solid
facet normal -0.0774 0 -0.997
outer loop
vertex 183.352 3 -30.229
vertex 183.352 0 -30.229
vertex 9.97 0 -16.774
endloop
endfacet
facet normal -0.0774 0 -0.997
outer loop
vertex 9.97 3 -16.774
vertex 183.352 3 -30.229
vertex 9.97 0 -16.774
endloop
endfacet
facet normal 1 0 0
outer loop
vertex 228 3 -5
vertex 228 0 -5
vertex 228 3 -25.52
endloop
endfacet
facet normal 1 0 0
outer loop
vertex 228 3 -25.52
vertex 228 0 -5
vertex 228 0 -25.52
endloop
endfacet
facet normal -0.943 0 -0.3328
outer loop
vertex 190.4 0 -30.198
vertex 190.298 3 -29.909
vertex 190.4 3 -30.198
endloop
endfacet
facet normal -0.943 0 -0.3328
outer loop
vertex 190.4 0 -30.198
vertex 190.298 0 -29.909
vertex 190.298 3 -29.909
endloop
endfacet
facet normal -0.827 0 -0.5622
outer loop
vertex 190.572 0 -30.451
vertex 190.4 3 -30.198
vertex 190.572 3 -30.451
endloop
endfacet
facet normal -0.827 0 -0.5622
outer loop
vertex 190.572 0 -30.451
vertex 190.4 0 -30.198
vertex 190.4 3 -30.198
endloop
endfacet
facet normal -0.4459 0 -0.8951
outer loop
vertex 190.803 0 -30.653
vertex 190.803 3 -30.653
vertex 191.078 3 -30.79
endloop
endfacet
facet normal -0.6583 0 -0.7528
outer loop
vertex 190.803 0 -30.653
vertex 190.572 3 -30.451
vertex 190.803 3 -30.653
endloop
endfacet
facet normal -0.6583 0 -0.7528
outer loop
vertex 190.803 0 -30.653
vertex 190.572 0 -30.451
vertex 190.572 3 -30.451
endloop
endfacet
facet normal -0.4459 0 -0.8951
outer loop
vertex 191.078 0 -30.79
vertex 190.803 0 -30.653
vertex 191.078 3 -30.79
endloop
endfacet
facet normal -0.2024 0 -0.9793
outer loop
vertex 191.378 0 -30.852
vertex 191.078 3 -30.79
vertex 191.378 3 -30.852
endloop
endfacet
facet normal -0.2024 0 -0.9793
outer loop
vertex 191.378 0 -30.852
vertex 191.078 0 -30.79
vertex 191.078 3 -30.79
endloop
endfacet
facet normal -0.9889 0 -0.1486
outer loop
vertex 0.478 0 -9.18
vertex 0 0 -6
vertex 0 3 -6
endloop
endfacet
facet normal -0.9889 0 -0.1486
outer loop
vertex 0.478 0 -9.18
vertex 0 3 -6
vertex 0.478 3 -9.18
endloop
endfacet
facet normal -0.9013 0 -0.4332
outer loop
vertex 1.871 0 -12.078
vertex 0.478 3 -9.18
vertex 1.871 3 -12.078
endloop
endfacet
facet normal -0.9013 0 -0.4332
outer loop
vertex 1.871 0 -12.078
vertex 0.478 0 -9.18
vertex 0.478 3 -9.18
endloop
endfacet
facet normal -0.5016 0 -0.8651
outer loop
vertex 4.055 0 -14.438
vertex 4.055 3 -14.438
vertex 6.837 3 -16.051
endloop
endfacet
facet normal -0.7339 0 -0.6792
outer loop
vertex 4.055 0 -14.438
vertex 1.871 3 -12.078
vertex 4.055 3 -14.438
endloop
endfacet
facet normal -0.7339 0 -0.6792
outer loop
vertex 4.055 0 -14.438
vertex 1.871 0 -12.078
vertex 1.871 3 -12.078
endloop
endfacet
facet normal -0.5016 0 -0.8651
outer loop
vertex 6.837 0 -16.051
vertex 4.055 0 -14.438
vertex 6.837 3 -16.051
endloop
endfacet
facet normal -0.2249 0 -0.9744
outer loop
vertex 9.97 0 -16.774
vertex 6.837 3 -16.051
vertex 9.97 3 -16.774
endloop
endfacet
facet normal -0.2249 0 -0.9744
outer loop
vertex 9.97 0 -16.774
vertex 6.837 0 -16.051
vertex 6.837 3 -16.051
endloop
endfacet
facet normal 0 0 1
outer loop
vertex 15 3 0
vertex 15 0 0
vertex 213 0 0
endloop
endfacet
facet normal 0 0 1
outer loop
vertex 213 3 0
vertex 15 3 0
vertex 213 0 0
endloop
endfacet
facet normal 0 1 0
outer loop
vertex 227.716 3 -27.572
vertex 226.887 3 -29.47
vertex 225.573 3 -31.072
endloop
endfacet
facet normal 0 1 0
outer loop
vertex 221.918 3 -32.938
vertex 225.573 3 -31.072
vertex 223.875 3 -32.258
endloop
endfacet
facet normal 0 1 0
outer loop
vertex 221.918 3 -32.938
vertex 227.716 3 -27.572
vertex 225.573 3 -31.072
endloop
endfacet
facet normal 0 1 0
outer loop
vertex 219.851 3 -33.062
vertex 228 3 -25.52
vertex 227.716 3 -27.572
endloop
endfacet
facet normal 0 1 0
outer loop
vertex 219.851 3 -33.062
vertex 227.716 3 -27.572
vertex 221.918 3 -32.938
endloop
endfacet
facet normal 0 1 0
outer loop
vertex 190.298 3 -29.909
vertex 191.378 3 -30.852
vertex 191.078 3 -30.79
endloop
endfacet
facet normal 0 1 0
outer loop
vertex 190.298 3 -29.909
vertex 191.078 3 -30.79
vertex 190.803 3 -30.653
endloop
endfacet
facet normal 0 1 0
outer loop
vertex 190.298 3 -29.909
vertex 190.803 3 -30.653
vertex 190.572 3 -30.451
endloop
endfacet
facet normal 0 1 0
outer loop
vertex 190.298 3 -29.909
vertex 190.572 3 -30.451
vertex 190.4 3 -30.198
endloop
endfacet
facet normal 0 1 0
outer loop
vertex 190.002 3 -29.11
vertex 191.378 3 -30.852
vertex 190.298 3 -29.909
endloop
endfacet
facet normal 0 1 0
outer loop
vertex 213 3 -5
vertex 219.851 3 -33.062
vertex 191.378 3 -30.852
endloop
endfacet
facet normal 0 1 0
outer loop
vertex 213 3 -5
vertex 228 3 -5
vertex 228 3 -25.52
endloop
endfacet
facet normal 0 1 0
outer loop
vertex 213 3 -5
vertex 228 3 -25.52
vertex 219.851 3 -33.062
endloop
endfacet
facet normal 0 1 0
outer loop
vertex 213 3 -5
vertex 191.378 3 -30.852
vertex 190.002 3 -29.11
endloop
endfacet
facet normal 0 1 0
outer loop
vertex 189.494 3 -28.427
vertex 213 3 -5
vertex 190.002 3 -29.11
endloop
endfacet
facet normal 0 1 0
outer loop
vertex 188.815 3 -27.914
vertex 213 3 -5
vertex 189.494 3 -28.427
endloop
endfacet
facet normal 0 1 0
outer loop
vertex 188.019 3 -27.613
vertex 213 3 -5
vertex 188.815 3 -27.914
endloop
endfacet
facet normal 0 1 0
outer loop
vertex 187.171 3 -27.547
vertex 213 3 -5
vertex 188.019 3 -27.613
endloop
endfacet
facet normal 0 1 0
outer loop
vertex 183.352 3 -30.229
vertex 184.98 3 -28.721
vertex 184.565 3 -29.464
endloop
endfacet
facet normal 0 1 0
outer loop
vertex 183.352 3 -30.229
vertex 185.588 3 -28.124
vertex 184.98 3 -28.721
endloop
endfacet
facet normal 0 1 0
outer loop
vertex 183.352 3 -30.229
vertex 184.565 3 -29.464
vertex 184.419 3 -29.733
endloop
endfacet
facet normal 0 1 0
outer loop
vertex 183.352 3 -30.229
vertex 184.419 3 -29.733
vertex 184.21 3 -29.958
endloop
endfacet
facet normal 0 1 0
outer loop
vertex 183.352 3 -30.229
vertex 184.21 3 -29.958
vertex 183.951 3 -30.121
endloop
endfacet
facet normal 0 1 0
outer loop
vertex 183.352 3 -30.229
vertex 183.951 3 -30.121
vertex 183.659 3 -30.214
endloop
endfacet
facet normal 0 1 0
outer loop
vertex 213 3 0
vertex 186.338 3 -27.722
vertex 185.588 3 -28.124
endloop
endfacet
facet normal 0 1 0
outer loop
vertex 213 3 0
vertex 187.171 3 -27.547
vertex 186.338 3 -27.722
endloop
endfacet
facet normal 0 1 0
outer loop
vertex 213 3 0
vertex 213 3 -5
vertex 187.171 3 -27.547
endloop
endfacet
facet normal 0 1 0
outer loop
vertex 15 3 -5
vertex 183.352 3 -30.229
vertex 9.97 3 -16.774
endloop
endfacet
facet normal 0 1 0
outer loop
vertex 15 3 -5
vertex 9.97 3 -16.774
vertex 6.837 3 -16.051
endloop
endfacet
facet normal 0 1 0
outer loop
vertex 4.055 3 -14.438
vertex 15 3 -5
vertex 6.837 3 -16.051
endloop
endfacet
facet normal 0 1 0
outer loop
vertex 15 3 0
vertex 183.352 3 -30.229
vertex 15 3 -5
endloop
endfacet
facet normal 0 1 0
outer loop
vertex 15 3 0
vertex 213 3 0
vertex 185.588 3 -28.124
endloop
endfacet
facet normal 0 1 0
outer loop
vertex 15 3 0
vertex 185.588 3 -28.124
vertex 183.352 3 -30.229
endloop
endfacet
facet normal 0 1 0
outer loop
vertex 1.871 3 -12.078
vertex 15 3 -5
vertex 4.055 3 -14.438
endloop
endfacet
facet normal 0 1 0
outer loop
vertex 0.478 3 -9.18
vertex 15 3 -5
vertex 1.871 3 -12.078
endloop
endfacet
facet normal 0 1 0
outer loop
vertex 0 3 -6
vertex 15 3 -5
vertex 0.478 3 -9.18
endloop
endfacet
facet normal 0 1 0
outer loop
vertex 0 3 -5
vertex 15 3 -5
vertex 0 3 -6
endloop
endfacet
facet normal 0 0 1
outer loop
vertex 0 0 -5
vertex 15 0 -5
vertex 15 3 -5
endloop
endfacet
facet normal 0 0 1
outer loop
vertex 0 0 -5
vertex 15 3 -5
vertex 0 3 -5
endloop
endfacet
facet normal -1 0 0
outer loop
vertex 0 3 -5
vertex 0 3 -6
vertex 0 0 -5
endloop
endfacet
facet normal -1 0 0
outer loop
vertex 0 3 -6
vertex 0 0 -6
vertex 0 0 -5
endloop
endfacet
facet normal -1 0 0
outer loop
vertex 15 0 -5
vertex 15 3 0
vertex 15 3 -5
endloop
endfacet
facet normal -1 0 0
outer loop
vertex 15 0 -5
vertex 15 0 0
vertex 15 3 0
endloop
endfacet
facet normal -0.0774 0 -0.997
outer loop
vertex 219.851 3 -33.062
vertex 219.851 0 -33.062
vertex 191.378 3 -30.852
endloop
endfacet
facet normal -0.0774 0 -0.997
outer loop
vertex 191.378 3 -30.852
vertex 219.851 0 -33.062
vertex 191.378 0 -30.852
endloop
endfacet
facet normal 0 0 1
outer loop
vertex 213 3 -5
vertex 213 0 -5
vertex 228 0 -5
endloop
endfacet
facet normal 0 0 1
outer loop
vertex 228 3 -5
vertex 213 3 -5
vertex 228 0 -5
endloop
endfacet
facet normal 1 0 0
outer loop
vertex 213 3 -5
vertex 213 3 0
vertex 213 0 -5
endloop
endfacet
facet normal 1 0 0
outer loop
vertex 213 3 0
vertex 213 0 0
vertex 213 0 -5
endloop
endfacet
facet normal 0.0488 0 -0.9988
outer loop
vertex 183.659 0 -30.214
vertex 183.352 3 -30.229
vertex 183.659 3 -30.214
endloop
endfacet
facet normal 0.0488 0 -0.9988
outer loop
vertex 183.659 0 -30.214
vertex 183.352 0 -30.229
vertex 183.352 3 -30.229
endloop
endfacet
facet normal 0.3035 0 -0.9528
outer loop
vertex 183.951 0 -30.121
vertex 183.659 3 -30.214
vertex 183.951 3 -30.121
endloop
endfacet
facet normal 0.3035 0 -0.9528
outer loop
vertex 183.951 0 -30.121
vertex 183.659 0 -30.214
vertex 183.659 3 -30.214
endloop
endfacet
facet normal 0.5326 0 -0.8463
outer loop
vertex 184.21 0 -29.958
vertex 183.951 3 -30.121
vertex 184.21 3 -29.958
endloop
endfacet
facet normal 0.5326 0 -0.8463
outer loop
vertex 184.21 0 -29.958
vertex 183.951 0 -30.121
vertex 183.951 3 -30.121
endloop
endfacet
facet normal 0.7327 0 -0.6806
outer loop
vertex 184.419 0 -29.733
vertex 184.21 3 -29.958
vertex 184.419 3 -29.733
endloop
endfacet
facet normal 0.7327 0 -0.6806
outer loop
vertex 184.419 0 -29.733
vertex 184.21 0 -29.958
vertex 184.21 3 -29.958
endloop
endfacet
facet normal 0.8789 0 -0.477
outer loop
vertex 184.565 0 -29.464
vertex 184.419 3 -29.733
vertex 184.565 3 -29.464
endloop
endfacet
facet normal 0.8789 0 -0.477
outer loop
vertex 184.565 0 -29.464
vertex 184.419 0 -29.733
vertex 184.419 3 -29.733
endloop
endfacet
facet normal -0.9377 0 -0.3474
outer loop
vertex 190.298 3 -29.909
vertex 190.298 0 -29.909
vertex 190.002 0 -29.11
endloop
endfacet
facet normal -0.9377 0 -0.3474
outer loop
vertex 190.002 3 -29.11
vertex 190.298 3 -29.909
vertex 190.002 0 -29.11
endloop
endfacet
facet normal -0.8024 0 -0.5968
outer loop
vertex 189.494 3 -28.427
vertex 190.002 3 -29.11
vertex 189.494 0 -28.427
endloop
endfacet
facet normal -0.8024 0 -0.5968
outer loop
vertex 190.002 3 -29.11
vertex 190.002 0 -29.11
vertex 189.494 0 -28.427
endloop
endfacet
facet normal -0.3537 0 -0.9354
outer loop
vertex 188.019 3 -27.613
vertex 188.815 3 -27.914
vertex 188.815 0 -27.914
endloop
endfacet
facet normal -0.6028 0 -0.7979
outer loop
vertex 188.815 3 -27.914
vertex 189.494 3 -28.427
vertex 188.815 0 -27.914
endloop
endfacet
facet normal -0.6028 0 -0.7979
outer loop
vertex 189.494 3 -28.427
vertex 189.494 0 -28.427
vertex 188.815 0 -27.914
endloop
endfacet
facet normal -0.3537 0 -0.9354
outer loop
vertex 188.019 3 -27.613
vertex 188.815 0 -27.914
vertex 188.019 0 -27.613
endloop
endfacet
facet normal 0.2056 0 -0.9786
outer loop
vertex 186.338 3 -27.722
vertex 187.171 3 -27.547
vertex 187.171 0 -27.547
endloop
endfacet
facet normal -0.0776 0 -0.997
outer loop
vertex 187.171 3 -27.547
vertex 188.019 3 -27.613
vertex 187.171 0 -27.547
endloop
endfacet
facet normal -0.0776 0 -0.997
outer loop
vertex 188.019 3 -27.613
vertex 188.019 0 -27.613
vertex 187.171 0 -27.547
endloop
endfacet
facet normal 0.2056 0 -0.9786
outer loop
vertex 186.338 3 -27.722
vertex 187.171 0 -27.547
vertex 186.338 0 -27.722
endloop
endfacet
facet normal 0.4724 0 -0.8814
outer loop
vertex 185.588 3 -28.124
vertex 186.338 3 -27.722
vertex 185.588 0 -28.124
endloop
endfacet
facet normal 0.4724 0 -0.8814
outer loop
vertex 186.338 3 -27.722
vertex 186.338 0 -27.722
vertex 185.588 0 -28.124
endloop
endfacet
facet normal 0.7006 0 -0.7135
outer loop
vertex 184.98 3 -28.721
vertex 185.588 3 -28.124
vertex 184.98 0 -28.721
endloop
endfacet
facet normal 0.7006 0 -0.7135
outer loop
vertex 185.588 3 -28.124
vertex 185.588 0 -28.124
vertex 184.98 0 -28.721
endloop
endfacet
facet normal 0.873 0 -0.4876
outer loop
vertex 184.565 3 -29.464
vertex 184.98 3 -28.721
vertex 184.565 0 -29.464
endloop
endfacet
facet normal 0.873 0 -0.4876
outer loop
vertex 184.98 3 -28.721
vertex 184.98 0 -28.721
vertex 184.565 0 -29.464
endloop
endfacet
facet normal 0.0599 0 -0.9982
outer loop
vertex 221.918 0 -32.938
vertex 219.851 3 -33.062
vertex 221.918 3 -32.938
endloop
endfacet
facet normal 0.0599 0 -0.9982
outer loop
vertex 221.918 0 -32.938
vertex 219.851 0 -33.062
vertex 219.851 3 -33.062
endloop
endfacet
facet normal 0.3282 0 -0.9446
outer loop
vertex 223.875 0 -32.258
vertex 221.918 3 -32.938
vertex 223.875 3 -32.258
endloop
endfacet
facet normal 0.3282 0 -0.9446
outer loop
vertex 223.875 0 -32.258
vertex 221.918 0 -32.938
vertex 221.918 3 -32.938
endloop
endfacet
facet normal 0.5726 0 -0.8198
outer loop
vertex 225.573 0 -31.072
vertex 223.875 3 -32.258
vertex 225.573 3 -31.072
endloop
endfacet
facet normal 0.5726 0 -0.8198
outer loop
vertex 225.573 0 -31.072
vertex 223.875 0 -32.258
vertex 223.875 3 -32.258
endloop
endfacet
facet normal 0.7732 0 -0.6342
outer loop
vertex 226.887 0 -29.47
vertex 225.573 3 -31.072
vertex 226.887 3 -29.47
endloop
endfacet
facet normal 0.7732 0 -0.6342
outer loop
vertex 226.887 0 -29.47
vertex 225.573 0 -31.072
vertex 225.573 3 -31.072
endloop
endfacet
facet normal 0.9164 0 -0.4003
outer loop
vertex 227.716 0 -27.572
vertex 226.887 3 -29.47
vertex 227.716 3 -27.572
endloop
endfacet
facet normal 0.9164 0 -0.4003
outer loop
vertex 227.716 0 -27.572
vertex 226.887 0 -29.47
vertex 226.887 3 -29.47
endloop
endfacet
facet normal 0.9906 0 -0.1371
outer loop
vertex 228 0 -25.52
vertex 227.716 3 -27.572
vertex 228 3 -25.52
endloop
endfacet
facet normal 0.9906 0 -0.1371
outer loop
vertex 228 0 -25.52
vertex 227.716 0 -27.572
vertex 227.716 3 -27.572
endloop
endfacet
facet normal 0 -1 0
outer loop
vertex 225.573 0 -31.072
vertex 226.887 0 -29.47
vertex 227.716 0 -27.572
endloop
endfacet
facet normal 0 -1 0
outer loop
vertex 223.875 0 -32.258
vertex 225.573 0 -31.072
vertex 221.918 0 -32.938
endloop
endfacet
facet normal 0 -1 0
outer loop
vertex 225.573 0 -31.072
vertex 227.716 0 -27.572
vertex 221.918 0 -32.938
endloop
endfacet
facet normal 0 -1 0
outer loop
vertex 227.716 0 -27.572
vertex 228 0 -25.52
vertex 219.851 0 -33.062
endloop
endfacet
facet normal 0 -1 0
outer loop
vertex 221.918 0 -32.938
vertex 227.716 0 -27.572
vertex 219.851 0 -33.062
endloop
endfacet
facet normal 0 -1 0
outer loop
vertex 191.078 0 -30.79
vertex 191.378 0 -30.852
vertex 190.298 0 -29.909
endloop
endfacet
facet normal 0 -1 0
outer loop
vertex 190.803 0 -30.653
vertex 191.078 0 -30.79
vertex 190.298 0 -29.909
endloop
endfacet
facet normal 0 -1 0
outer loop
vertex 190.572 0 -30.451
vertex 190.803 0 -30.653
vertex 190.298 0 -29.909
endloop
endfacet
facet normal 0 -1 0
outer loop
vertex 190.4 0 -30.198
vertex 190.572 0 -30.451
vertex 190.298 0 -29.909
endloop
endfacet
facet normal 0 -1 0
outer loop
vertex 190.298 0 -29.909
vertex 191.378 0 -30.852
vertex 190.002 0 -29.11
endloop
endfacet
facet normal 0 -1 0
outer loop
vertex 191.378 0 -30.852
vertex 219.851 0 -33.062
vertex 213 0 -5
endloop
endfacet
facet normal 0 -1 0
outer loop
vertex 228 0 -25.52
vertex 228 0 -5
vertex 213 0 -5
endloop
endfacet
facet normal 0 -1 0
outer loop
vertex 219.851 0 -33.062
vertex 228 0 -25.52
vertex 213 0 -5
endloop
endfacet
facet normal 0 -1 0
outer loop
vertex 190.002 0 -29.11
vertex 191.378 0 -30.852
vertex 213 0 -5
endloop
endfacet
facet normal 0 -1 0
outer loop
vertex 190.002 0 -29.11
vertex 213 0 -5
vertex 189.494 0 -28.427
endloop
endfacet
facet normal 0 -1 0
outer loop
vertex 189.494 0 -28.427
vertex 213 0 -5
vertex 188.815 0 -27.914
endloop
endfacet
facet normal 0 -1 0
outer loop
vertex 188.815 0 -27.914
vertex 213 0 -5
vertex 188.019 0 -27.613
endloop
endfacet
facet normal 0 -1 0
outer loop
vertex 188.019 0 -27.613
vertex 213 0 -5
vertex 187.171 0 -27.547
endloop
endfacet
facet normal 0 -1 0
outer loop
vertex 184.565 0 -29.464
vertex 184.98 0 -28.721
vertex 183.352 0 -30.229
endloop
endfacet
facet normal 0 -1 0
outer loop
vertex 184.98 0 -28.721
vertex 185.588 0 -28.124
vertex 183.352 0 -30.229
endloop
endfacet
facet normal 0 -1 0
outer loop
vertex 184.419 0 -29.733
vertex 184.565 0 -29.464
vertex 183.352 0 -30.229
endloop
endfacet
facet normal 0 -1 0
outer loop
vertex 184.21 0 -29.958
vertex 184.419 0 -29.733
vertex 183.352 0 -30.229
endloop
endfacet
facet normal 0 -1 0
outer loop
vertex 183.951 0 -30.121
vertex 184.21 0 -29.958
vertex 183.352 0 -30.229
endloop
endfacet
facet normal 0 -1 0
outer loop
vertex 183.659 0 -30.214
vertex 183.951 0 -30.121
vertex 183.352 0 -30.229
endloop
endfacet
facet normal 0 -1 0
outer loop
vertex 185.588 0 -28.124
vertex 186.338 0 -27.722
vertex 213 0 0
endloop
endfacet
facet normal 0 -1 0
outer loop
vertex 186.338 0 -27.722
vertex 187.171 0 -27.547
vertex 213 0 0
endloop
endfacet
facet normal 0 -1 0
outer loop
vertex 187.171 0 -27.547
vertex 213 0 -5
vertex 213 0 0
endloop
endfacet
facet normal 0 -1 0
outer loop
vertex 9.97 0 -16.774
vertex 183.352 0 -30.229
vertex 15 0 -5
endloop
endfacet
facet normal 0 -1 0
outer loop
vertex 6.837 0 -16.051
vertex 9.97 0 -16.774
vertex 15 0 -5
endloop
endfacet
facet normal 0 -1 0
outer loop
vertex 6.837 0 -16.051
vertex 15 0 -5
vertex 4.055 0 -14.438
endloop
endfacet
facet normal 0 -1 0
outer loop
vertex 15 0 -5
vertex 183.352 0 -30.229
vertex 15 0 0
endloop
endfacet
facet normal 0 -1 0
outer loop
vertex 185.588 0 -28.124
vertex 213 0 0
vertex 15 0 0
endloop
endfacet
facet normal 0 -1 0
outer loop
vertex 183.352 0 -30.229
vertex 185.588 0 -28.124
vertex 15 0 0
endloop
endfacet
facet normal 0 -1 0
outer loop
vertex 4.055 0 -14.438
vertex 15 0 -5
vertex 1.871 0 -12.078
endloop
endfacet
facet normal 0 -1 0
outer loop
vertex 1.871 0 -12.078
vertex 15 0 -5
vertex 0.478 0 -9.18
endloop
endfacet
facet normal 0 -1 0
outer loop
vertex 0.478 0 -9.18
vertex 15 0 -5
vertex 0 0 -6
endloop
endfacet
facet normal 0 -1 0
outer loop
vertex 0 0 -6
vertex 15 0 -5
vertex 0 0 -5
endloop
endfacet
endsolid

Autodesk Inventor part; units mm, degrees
ref_plane "YZ Plane" through (0, 0, 0) normal (1, 0, 0) x (0, 1, 0)
ref_plane "XZ Plane" through (0, 0, 0) normal (0, 1, 0) x (-1, 0, 0)
ref_plane "XY Plane" through (0, 0, 0) normal (0, 0, 1) x (1, 0, 0)
sketch "Sketch2" plane through (0, 0, 0) normal (0, 1, 0) x (-1, 0, 0)
  line L0 (0, 0) -> (-228, 0)
  line L1 (-228, 0) -> (-228, -33.6943)
  line L2 (-228, -33.6943) -> (0, -16)
  arc A0 (-228, -25.5205) -> (-219.8507, -33.0618) centre (-220.436, -25.5205) ccw
  arc A1 (-184.5652, -29.4637) -> (-190.2978, -29.9086) centre (-187.3652, -30.5408) ccw
  arc A2 (-191.378, -30.8522) -> (-190.2978, -29.9086) centre (-191.4709, -29.6558) ccw
  arc A3 (-184.5652, -29.4637) -> (-183.3523, -30.2293) centre (-183.4452, -29.0329) ccw
  line L3 (0, 0) -> (-15, 0)
  line L4 (-15, 0) -> (-15, -5)
  line L5 (-15, -5) -> (0, -5)
  line L6 (-228, 0) -> (-213, 0)
  line L7 (-213, 0) -> (-213, -5)
  line L8 (-213, -5) -> (-228, -5)
  line L9 (-228, -5) -> (-228, 0)
  line L10 (0, -16) -> (0, -5)
  arc A4 (-9.97, -16.7737) -> (0, -6) centre (-10.8061, -6) ccw
  point P0 (-220.5, -5)
  point P1 (-7.5, -5)
  point P2 (-15, 0)
  dimension "xp" = 228
  dimension "corner" = 7.564
  dimension "d9" = 1.2
  dimension "d10" = 1.2
  dimension "d15" = 15
  dimension "d16" = 3
  dimension "d20" = 15
  dimension "cutoutdepth" = 5
  dimension "cutoutlength" = 198
  dimension "theta" = 4.438
  dimension "raised" = 11
  dimension "d25" = 10.8061
  dimension "d26" = 1
extrude "Extrusion1" add sketch "Sketch2" along normal blind 3 contours L4 L5 L10 A4 L2 A3 A1 A2 A0 L1 L8 L7 L0
equation "\"d15\" = cutoutoffset"
equation "\"d20\" = cutoutoffset"
equation "\"b\" = 17.7"
equation "\"cutoutoffset\" = 15"
properties part number "rail"
